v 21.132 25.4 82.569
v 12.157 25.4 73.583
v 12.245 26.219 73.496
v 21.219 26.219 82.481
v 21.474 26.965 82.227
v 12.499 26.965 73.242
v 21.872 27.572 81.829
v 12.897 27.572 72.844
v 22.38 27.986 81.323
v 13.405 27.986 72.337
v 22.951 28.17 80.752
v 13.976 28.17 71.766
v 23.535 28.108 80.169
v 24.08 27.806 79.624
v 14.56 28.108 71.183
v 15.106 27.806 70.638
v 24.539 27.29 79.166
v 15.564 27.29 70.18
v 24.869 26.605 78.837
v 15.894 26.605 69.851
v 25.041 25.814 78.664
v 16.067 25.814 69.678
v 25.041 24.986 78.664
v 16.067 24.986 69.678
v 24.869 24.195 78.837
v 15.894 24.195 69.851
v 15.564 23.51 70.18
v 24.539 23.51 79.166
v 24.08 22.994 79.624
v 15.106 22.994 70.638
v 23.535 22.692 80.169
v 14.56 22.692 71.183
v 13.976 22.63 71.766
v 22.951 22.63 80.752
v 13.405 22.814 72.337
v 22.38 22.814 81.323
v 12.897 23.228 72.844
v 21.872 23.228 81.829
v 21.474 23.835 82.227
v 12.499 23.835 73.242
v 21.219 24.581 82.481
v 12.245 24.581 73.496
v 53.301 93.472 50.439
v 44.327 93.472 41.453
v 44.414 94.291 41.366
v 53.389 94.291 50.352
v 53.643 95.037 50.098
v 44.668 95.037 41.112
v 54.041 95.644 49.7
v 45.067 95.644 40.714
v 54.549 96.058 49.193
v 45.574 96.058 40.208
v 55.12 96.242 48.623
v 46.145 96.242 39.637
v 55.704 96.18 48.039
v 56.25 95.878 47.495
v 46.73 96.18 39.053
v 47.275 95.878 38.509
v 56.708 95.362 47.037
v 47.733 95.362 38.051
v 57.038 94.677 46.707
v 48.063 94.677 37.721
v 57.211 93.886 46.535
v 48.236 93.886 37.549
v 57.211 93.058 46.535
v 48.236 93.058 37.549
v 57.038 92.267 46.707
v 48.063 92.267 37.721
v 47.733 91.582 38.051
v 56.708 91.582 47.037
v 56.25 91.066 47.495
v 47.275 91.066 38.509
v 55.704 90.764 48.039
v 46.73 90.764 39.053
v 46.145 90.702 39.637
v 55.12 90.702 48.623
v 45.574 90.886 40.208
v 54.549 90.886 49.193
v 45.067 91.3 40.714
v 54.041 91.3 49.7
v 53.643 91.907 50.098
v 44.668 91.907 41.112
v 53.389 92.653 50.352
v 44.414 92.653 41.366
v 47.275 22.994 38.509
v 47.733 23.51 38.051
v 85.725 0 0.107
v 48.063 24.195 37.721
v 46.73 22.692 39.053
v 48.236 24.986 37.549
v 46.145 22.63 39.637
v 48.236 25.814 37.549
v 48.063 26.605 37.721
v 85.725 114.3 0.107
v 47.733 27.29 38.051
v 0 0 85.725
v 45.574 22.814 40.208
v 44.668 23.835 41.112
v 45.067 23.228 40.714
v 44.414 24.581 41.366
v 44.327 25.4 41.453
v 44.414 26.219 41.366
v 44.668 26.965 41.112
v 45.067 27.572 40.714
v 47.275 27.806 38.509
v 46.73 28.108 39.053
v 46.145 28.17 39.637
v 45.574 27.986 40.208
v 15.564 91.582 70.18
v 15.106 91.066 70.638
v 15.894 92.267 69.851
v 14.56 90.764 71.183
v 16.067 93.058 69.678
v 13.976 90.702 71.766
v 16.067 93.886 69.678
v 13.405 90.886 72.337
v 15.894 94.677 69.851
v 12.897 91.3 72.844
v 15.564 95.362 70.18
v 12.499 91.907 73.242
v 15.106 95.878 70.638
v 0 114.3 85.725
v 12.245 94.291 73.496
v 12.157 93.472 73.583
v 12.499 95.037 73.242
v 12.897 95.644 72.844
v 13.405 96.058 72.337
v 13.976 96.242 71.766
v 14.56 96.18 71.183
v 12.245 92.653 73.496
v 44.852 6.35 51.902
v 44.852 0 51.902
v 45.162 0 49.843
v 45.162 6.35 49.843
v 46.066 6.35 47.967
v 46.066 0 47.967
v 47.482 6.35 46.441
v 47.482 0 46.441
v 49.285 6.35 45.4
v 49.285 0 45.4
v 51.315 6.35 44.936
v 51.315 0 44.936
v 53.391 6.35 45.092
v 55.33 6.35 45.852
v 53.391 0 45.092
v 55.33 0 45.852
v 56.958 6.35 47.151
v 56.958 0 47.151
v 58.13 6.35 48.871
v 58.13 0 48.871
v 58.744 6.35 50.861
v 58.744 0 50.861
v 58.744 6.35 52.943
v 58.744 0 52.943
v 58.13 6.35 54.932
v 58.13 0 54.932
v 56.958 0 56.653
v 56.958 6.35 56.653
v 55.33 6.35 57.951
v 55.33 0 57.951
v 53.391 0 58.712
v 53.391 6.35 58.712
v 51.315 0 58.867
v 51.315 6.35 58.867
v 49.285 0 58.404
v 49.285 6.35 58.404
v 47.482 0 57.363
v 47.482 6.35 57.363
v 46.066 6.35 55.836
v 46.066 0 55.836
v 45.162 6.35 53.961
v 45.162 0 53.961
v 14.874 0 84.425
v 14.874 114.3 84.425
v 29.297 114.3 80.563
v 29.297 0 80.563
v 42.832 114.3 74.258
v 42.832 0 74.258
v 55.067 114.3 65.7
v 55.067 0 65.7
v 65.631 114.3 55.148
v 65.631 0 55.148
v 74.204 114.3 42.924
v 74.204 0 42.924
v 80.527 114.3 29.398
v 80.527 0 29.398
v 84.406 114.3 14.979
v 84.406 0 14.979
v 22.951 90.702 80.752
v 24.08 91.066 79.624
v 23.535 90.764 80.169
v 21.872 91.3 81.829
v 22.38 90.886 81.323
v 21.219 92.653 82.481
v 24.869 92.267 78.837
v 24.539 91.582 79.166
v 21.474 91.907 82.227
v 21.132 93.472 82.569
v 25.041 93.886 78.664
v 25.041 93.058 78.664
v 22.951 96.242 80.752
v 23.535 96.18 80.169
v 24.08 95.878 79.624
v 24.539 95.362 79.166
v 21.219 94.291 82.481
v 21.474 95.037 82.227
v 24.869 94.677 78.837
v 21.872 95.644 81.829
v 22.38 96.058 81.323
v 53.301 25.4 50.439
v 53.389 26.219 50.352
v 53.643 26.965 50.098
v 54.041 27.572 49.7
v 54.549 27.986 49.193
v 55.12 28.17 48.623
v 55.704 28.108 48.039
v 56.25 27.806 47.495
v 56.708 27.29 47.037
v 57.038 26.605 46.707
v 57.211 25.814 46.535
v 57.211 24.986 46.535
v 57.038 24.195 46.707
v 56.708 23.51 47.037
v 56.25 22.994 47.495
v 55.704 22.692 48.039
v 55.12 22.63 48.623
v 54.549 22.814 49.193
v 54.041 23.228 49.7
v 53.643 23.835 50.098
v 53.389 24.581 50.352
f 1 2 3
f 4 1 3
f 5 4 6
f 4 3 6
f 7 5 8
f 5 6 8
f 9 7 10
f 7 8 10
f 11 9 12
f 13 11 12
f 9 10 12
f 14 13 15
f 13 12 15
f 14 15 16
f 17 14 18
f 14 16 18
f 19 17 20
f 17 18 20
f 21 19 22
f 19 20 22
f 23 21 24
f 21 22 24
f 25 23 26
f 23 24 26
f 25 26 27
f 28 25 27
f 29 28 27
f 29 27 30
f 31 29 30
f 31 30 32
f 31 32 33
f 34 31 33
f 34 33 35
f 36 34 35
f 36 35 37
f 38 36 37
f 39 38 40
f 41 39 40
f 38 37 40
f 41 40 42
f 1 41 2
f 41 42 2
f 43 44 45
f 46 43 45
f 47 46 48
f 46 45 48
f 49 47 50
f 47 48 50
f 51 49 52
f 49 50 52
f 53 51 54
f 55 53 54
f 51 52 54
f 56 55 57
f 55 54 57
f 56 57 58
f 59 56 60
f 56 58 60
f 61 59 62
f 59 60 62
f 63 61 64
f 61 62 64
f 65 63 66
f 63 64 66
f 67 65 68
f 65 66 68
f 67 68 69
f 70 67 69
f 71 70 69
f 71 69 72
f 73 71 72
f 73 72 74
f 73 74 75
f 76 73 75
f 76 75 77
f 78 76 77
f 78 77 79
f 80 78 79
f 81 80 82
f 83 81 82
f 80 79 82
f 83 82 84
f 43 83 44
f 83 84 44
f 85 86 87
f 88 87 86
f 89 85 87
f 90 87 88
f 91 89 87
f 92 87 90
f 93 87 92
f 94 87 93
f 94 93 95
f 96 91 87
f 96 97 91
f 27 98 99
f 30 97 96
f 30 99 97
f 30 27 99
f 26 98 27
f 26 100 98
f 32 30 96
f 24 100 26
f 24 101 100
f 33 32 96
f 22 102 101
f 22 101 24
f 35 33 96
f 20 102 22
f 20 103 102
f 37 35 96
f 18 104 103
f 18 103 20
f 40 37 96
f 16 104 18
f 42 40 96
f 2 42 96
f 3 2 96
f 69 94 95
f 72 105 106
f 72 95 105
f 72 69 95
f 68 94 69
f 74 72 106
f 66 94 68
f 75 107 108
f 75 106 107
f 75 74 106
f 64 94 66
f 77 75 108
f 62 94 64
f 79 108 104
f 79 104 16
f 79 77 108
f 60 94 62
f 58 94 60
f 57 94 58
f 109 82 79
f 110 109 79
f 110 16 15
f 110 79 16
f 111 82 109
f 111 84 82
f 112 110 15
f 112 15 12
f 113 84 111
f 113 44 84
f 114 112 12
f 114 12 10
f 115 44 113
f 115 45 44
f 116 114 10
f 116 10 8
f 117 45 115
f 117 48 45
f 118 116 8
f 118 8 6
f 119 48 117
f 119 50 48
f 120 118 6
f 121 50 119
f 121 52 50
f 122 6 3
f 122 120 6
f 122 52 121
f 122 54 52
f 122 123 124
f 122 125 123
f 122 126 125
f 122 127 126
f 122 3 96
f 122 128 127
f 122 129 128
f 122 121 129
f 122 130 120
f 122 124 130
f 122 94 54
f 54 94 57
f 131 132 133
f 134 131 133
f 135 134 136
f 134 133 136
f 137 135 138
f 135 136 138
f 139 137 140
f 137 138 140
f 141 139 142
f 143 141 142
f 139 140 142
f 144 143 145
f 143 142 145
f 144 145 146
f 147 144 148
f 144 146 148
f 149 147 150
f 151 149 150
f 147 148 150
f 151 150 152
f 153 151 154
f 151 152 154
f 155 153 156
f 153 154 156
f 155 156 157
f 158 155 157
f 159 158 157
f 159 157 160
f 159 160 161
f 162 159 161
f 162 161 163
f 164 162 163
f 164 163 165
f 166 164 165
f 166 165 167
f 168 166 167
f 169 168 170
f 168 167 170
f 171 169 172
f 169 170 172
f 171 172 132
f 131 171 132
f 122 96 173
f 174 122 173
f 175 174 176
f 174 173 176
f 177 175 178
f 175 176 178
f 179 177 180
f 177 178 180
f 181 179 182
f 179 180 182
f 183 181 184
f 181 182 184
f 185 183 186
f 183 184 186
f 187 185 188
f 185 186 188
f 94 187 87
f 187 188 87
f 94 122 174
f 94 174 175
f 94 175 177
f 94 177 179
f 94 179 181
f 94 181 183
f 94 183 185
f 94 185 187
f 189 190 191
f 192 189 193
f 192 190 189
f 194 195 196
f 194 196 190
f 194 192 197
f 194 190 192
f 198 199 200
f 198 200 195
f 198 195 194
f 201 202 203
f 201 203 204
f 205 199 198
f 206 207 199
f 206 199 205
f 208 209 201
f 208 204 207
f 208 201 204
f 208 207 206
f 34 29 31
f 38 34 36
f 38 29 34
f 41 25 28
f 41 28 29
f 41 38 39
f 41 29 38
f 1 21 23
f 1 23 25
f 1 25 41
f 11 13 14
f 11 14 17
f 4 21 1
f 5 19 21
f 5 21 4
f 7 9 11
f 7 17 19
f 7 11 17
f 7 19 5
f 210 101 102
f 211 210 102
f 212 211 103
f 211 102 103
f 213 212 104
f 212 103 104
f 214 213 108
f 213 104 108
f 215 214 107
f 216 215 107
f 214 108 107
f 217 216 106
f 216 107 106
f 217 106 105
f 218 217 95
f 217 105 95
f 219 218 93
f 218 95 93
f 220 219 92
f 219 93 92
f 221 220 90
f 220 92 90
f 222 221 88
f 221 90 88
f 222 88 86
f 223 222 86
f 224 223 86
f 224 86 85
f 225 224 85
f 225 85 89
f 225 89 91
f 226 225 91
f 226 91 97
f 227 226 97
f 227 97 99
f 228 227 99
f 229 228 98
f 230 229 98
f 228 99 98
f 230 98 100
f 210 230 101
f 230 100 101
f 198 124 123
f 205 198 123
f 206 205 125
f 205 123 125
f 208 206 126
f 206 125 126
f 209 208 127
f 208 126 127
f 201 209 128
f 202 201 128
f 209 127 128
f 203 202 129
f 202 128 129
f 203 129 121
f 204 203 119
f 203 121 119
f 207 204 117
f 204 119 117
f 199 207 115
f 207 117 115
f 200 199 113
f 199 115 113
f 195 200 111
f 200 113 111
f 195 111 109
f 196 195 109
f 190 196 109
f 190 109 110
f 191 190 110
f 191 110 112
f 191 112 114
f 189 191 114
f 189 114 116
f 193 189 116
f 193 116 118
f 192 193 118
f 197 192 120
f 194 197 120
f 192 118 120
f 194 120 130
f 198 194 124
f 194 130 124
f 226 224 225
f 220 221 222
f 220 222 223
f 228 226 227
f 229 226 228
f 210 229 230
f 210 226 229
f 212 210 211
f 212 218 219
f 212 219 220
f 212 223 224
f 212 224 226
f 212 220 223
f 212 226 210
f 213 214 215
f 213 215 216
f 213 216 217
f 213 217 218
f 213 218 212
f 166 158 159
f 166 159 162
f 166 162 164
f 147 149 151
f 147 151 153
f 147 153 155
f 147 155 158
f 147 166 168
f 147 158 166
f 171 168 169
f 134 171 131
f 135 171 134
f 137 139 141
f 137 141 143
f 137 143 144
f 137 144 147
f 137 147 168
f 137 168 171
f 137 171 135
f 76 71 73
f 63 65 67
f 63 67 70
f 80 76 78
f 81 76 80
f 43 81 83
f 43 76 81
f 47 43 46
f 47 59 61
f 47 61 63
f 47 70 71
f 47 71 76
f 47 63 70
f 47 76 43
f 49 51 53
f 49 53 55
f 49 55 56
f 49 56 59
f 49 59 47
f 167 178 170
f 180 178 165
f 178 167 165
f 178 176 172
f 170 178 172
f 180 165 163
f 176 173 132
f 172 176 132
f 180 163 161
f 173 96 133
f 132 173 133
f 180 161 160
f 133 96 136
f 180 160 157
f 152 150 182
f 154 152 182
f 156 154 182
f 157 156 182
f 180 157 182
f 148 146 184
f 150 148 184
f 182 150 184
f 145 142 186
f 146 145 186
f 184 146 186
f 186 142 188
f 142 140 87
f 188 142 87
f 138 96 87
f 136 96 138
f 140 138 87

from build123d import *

# Parameters (mm, degrees)
SKETCH1_R           = 85.725
BOSS_EXTRUDE1_DEPTH = 114.3
CUT_EXTRUDE1_DEPTH  = 152.4
SKETCH4_R           = 2.778125
CUT_EXTRUDE2_DEPTH  = 12.7
SKETCH5_R           = 6.985
CUT_EXTRUDE3_DEPTH  = 6.35


with BuildPart() as part:
    # Sketch1 → Boss-Extrude1 (new body)
    with BuildSketch(Plane(origin=(0, 0, 0), x_dir=(1, 0, 0), z_dir=(0, 1, 0))):
        Circle(SKETCH1_R)
    extrude(amount=BOSS_EXTRUDE1_DEPTH)

    # Sketch2 → Cut-Extrude1 (cut)
    with BuildSketch(Plane(origin=(0, 114.3, 0), x_dir=(1, 0, 0), z_dir=(0, 1, 0))):
        Polygon((85.724933621, -0.10668), (0, -85.725), (-45.627504124, -96.719379999), (-137.428949547, 46.173941299), (19.12530113, 101.910533163), (109.833872203, 30.600481808), align=None)
    extrude(amount=-CUT_EXTRUDE1_DEPTH, mode=Mode.SUBTRACT)

    # Sketch4 → Cut-Extrude2 (cut)
    with BuildSketch(Plane(origin=(42.862466811, 0, 42.91584), x_dir=(-0.707546622, 0, 0.706666667), z_dir=(-0.706666667, 0, -0.707546622))):
        with Locations((40.618496709, 93.472)):
            Circle(SKETCH4_R)
        with Locations((-4.847503262, 93.472)):
            Circle(SKETCH4_R)
        with Locations((-4.847503262, 25.4)):
            Circle(SKETCH4_R)
        with Locations((40.618496632, 25.4)):
            Circle(SKETCH4_R)
    extrude(amount=-CUT_EXTRUDE2_DEPTH, mode=Mode.SUBTRACT)

    # Sketch5 → Cut-Extrude3 (cut)
    with BuildSketch(Plane(origin=(0, 0, 0), x_dir=(-1, 0, 0), z_dir=(0, -1, 0))):
        with Locations((-51.837133477, -51.901682099)):
            Circle(SKETCH5_R)
    extrude(amount=-CUT_EXTRUDE3_DEPTH, mode=Mode.SUBTRACT)


solid = part.part
